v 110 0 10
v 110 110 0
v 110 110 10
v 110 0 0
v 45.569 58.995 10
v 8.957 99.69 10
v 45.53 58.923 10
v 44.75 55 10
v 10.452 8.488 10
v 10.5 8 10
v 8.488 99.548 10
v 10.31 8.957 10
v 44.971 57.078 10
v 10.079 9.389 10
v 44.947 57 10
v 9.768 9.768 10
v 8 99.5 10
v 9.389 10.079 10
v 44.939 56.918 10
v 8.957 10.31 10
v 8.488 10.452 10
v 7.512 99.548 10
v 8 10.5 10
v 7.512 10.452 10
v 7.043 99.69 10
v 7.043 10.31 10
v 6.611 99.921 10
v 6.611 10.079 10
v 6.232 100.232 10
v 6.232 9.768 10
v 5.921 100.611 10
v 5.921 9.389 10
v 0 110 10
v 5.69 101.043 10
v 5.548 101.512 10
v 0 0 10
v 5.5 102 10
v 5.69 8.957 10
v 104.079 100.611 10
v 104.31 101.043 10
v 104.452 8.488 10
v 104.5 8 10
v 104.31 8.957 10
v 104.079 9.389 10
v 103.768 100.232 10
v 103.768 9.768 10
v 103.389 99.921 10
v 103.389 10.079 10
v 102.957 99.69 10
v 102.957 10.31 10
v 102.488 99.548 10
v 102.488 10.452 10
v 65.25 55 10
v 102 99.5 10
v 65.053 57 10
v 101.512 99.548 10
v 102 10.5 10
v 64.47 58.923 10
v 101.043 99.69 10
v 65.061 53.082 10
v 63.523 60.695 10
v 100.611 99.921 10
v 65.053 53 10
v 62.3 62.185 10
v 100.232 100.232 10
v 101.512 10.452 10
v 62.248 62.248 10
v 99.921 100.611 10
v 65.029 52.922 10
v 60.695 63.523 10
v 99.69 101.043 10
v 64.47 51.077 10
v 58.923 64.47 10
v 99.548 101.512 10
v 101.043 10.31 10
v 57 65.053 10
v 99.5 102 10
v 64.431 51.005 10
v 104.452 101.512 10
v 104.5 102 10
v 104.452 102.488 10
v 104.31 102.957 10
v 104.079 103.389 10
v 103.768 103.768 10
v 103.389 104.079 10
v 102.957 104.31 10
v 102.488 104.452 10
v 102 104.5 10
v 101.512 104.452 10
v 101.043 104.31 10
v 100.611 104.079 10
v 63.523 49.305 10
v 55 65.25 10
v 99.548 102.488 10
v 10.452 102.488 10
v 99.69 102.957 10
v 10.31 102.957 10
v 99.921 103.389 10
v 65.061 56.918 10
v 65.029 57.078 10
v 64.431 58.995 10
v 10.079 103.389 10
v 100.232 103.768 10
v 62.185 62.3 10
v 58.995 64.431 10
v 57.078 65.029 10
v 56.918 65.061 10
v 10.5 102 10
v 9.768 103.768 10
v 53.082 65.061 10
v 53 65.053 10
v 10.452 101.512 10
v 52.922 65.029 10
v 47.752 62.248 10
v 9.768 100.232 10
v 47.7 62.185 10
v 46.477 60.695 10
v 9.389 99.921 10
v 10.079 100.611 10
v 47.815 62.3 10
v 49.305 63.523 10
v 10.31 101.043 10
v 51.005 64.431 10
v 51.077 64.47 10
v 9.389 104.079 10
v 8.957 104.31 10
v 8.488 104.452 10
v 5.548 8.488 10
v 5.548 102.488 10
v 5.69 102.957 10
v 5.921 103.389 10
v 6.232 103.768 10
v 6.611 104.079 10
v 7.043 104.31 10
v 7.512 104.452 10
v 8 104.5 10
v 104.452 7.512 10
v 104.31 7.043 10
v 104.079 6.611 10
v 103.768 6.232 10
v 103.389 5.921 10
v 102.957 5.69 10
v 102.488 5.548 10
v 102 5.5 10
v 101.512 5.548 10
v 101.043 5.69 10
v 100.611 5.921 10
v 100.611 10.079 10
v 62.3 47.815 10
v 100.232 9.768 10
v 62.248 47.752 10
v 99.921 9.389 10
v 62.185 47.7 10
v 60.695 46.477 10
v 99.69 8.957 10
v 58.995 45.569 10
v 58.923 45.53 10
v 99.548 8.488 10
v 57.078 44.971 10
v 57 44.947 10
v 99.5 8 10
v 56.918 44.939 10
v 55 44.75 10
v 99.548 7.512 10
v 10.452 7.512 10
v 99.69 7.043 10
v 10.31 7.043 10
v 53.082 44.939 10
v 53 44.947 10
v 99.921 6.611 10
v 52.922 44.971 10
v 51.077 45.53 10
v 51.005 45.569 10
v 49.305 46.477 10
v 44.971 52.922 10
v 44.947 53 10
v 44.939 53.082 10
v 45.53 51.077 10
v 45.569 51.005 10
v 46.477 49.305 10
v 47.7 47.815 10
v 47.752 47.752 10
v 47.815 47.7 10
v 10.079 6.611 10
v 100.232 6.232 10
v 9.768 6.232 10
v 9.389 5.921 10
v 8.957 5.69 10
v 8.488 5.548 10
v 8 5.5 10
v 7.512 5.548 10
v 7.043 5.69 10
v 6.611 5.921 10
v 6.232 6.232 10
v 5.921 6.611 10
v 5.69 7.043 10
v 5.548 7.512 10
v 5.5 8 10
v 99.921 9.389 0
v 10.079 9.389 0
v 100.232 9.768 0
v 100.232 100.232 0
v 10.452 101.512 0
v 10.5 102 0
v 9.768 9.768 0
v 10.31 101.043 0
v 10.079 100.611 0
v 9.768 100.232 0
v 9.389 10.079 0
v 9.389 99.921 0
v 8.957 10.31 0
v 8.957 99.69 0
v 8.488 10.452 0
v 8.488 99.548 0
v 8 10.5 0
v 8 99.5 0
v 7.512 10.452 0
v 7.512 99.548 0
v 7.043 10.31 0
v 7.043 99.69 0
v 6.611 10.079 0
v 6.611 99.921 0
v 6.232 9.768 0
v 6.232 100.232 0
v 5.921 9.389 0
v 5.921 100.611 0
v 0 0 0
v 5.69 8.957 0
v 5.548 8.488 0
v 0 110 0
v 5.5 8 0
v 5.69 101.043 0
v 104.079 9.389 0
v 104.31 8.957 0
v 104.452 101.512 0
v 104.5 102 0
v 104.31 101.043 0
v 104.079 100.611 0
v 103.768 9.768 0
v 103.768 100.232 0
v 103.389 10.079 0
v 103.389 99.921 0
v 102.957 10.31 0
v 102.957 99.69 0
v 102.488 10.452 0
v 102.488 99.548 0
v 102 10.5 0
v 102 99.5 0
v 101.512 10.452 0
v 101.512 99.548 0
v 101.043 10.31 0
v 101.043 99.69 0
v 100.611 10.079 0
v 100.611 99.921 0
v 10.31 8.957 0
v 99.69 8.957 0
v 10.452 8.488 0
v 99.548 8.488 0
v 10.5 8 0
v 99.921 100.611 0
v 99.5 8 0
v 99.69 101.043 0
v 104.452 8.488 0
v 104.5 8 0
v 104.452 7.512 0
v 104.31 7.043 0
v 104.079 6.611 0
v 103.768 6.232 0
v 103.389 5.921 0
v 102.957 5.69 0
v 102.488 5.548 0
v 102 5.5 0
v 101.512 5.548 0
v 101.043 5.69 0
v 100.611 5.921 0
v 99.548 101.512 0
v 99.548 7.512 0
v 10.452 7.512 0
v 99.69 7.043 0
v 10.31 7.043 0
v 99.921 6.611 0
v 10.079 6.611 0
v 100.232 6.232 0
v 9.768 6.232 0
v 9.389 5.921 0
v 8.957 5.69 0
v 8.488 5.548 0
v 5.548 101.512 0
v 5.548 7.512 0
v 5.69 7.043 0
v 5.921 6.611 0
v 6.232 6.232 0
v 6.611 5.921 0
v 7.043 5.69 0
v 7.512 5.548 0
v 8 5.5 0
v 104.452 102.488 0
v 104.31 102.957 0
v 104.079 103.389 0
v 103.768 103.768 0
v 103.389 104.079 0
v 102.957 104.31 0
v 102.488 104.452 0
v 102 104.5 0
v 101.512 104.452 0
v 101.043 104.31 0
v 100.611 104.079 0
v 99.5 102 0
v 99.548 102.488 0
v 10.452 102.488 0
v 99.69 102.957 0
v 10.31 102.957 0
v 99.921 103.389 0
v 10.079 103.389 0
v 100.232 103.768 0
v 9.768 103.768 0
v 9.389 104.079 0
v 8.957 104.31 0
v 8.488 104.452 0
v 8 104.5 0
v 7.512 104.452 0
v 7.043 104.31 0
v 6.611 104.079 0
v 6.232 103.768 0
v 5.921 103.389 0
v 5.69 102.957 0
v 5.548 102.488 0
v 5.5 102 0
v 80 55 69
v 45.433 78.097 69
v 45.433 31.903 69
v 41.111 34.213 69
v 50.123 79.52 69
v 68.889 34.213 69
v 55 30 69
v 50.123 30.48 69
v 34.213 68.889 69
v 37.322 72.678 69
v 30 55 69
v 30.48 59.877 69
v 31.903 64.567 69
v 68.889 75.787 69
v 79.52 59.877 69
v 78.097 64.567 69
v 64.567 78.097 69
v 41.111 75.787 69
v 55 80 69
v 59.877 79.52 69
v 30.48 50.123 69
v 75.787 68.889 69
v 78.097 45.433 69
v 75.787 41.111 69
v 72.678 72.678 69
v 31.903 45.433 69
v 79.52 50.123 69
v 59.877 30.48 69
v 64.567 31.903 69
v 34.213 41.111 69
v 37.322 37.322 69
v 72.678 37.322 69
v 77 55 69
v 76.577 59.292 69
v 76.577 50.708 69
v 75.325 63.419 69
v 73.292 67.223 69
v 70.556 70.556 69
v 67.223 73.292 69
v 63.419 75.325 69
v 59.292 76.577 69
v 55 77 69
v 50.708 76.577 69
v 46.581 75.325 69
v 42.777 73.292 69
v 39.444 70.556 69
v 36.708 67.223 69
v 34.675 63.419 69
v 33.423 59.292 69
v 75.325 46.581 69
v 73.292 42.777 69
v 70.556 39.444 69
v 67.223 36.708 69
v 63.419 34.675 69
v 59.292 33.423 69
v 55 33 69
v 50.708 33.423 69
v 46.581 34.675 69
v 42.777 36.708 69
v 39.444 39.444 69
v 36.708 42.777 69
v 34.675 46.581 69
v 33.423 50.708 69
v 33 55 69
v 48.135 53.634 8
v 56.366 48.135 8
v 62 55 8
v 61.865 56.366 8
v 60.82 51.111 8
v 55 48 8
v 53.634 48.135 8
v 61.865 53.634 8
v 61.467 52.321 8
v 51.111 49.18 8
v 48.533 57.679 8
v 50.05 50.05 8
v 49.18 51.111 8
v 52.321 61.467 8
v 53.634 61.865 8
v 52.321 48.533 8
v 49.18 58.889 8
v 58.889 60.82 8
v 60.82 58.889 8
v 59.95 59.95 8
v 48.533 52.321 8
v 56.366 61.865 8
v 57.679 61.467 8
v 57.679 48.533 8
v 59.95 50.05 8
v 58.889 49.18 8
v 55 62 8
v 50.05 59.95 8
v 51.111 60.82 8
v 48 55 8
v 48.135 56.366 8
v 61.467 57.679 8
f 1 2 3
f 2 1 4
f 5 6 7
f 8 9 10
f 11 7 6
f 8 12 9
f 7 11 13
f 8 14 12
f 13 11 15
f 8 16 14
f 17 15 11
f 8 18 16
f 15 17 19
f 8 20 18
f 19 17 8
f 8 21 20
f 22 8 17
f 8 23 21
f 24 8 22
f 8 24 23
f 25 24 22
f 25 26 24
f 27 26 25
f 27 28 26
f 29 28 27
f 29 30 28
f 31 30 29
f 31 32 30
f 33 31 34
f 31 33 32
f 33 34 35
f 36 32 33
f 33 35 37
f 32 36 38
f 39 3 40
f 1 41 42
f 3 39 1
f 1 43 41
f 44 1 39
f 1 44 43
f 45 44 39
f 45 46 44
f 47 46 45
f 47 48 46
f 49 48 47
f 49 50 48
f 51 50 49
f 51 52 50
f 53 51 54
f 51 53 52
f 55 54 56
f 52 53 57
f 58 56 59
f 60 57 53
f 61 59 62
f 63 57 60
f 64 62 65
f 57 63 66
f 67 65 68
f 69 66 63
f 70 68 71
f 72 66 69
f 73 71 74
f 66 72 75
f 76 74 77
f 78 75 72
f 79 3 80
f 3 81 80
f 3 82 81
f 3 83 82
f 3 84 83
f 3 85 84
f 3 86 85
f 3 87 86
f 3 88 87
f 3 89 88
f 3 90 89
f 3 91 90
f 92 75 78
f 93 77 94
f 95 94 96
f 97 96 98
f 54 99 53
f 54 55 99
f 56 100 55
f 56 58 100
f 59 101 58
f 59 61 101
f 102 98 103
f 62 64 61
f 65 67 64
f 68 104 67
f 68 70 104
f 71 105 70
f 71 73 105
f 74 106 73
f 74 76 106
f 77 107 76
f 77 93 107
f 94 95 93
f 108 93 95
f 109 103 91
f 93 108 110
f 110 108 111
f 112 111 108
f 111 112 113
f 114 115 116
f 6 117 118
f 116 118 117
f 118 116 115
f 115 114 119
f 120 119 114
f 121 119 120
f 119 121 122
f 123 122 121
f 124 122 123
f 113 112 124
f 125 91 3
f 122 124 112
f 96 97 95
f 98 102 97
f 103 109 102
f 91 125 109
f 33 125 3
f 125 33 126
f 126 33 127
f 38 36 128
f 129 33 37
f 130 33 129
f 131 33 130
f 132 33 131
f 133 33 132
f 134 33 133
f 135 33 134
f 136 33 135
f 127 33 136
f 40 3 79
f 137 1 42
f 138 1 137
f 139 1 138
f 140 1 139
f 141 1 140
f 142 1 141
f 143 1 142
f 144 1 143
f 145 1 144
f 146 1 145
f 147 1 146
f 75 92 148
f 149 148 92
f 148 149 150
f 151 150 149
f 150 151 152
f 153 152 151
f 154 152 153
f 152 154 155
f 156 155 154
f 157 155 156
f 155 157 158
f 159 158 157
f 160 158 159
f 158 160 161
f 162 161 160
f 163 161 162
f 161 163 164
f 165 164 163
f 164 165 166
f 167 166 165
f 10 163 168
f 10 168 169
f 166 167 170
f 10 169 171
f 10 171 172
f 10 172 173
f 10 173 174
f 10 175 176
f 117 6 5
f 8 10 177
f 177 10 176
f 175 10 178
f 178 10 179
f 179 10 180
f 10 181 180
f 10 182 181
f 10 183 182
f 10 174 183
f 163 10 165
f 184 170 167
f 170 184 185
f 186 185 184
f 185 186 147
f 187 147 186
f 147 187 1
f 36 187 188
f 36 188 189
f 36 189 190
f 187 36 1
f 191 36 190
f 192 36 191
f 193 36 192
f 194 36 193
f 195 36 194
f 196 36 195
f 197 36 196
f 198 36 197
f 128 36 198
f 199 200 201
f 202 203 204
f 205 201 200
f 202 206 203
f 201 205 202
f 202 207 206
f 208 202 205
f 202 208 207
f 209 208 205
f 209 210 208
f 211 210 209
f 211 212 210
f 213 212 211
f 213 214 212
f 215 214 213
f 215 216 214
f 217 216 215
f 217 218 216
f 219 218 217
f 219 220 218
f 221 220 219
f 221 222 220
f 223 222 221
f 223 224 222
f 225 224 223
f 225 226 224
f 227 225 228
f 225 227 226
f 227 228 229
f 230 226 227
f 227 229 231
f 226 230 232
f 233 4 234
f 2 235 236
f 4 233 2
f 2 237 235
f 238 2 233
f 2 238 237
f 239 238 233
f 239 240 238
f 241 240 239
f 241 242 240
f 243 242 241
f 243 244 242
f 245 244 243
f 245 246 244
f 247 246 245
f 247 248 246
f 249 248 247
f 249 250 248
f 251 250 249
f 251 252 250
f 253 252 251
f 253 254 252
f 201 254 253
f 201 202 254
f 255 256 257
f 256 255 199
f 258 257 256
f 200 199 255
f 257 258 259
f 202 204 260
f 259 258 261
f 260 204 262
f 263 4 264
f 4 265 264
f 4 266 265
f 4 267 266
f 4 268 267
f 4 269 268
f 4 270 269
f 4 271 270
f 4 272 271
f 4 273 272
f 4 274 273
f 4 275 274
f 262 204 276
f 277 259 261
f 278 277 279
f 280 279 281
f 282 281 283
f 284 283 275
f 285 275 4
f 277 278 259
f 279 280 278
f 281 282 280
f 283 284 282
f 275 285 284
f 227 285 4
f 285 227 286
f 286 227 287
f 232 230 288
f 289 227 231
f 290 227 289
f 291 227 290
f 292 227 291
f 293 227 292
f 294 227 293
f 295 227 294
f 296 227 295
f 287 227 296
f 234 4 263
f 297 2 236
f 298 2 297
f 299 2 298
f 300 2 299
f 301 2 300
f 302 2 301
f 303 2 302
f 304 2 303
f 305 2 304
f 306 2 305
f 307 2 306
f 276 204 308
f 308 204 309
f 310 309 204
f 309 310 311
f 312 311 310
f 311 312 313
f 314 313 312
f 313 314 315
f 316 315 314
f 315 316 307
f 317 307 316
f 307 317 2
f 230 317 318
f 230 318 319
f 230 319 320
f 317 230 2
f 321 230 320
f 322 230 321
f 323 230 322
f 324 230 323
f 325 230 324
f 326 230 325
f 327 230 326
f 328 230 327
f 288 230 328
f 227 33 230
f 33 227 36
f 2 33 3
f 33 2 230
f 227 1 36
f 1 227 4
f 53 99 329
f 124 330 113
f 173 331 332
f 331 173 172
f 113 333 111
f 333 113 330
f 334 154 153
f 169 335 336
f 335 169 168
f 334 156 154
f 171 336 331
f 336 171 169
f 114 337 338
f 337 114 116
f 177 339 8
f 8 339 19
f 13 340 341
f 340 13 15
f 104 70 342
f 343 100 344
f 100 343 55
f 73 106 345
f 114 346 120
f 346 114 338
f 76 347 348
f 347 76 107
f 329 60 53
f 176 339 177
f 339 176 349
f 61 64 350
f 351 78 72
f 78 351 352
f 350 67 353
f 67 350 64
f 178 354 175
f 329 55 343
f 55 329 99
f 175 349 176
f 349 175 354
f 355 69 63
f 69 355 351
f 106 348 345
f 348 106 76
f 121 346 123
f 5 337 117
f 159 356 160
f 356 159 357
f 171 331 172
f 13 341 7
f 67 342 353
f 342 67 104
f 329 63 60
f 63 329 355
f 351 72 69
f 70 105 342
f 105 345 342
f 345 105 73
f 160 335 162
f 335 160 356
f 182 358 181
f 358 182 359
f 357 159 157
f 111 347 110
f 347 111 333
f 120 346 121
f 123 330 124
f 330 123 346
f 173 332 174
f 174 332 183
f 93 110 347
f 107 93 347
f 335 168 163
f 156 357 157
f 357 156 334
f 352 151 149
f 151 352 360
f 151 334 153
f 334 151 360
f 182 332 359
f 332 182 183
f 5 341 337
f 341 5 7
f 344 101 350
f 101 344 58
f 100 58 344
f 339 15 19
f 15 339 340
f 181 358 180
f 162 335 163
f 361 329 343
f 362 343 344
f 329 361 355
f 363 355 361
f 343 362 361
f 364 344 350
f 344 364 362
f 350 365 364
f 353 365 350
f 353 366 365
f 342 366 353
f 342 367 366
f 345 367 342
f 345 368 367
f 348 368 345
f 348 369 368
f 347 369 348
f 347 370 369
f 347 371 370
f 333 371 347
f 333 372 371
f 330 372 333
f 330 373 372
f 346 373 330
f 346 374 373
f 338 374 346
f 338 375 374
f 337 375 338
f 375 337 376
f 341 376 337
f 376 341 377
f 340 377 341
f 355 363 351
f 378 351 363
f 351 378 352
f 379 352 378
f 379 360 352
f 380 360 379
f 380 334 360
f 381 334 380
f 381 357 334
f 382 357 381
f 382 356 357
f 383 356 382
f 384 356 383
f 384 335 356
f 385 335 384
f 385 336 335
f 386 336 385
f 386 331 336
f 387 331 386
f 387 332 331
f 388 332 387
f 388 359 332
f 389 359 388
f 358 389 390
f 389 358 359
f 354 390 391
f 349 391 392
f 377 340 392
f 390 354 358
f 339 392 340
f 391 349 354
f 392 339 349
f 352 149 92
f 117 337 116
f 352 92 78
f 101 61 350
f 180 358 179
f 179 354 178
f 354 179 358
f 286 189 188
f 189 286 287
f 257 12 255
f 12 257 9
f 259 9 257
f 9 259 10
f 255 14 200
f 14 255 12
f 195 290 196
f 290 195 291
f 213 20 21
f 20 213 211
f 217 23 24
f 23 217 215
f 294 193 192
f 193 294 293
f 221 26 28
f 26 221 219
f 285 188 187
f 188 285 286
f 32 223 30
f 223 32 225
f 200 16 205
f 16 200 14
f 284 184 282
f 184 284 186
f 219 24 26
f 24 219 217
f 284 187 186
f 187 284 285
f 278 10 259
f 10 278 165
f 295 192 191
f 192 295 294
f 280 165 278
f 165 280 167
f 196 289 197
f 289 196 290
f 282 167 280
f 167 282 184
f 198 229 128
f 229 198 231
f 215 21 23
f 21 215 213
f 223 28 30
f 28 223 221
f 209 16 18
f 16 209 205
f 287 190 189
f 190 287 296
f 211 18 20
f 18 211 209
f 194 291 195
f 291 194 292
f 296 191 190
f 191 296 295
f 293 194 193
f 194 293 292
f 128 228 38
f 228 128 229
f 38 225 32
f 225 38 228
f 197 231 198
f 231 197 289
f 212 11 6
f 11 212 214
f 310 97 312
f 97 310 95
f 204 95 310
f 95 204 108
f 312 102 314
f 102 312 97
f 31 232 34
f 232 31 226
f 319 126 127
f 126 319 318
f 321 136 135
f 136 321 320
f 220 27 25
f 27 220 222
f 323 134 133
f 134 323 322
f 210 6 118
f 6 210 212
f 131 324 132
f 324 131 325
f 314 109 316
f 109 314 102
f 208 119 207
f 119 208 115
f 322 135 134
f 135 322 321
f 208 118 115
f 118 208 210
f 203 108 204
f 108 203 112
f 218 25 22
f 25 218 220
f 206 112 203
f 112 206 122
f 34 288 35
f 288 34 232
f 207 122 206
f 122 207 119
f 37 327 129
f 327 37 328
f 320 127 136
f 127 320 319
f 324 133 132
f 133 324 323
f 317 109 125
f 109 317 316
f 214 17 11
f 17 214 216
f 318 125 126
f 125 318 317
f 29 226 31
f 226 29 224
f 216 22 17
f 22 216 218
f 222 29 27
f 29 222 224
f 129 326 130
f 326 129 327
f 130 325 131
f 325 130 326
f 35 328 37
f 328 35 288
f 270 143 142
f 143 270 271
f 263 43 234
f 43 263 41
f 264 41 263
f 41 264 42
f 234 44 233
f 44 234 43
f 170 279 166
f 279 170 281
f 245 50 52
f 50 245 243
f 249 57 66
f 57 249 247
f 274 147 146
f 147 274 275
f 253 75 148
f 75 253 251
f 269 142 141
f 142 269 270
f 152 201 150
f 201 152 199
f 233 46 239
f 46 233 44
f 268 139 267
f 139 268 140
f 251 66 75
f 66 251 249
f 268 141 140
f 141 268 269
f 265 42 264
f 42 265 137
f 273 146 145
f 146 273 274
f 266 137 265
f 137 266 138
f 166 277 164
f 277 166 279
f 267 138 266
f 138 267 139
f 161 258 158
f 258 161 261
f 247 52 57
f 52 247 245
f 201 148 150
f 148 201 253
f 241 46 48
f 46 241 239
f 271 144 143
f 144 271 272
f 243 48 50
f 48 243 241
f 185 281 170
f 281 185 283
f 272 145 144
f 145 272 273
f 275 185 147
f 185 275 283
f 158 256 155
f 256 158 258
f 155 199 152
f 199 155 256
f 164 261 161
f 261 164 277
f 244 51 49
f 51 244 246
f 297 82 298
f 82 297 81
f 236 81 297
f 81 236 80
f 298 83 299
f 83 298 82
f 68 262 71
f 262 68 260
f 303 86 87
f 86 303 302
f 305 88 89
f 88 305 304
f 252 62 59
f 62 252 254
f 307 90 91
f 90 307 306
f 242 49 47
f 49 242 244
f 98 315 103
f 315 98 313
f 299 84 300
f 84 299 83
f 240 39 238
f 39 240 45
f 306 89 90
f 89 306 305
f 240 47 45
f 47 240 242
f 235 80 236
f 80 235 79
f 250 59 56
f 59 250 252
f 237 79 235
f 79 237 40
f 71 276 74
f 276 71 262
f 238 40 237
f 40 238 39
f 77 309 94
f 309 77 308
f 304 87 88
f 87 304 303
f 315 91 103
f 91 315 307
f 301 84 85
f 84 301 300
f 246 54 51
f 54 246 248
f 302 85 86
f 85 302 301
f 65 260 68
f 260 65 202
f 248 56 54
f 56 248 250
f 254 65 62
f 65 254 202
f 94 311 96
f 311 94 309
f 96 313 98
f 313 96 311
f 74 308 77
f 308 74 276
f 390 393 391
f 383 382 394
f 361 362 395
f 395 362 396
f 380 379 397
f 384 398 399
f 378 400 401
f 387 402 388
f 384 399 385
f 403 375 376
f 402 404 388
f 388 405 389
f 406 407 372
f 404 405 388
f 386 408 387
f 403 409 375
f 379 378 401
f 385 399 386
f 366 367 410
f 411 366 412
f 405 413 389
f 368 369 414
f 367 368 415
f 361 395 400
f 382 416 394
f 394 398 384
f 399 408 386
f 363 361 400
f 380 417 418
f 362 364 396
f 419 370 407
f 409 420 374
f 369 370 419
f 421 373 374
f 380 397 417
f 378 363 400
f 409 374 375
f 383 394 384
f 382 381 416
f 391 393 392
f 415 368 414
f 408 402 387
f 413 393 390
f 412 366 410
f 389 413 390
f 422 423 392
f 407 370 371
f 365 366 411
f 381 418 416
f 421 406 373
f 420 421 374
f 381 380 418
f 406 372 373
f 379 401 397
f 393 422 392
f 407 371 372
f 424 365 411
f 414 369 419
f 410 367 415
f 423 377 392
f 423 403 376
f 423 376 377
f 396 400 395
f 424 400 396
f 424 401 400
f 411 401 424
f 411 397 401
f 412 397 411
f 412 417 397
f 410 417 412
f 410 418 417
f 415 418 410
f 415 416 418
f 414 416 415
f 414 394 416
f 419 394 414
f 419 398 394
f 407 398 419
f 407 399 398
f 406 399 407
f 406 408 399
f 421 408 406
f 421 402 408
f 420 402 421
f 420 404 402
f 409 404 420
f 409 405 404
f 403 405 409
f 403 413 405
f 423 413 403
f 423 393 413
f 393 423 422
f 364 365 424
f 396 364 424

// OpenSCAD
$fn = 32;

// ----------------------------------------------------------------------
// Hopper: flanged with square flange
// ----------------------------------------------------------------------

// --- parameters (mm) ---
fl = 110;                 // flange side, X and Y
fl_t = 10;                // flange thickness
cone_h = 60;              // cone height above the flange
top_d = 50;               // cone mouth diameter
bot_d = 20;               // cone spout diameter
wall = 3;                 // cone wall thickness
hole_r = 2.5;             // flange hole radius
hole_in = 8;              // hole inset from the corners

bore_d = bot_d - 2 * wall;  // spout bore diameter
total_h = fl_t + cone_h - 1;  // overall height

difference() {
  union() {
    cube([fl, fl, fl_t]);
    translate([fl / 2, fl / 2, fl_t - 1])
      cylinder(h = cone_h, d1 = bot_d, d2 = top_d);
  }
  translate([fl / 2, fl / 2, fl_t - 2])
    cylinder(h = cone_h + 1, d1 = bore_d, d2 = top_d - 2 * wall);
  for (sx = [0, 1], sy = [0, 1])
    translate([sx ? fl - hole_in : hole_in,
               sy ? fl - hole_in : hole_in, -1])
      cylinder(r = hole_r, h = fl_t + 2);
}
